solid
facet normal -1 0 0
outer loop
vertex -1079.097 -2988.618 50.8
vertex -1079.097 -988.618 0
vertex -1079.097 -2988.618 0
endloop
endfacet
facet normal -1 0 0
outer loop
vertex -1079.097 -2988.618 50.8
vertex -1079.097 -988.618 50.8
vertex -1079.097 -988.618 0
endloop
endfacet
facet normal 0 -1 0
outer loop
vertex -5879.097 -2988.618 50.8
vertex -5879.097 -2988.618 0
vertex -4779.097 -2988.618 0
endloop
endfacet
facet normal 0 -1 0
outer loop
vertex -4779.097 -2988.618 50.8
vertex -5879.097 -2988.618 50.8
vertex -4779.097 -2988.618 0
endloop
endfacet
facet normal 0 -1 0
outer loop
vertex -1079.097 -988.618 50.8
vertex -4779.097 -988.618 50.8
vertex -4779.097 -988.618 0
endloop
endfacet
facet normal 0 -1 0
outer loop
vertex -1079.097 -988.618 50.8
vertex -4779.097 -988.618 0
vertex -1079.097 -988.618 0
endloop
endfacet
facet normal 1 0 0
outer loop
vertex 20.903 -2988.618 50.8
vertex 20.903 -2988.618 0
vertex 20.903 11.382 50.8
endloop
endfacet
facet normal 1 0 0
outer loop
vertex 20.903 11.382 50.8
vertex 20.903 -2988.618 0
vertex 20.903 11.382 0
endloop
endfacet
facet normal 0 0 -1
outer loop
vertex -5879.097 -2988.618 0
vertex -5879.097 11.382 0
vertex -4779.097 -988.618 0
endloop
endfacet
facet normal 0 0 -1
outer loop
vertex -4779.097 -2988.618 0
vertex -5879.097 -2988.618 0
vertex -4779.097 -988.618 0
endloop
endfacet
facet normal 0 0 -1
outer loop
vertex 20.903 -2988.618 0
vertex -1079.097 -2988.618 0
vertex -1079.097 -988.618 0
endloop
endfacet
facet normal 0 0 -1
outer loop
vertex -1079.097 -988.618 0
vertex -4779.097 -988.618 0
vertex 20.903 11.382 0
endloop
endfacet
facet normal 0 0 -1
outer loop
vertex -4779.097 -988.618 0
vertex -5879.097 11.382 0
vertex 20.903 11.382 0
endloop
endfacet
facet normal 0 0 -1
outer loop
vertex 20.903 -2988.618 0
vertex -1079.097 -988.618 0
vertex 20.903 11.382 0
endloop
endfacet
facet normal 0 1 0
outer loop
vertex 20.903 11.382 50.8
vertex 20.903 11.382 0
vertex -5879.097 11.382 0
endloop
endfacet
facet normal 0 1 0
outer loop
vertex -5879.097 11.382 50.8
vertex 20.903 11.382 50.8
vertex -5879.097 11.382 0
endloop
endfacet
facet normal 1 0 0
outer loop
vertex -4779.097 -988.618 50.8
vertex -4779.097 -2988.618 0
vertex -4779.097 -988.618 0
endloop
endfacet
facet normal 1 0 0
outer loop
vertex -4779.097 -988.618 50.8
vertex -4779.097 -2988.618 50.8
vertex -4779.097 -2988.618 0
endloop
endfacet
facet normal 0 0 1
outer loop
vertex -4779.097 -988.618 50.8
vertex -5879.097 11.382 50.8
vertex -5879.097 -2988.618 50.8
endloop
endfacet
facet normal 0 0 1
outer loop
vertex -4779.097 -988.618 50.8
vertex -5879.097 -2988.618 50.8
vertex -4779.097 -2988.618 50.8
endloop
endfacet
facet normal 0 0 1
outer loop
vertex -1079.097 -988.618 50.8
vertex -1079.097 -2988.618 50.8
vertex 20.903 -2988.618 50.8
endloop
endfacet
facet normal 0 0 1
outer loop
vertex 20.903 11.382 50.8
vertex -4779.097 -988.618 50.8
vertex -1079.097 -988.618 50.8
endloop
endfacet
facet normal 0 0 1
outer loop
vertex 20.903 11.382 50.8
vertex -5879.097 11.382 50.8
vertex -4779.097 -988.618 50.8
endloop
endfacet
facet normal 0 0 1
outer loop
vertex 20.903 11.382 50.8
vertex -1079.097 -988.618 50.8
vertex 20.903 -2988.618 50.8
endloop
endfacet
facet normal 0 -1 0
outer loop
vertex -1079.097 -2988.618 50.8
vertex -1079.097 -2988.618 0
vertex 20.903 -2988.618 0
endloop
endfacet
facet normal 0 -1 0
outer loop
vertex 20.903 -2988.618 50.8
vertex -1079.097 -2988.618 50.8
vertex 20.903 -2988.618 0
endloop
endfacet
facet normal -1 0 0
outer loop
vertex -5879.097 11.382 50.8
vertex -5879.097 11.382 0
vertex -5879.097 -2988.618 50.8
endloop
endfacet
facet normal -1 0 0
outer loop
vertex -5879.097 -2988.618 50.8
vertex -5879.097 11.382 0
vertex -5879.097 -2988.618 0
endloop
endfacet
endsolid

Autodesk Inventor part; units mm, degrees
ref_plane "YZ Plane" through (0, 0, 0) normal (1, 0, 0) x (0, 1, 0)
ref_plane "XZ Plane" through (0, 0, 0) normal (0, 1, 0) x (-1, 0, 0)
ref_plane "XY Plane" through (0, 0, 0) normal (0, 0, 1) x (1, 0, 0)
sketch "Sketch1" plane through (0, 0, 0) normal (0, 0, 1) x (1, 0, 0)
  line L0 (-5879.0972, -2988.6181) -> (20.9028, -2988.6181)
  line L1 (20.9028, -2988.6181) -> (20.9028, 11.3819)
  line L2 (20.9028, 11.3819) -> (-5879.0972, 11.3819)
  line L3 (-5879.0972, 11.3819) -> (-5879.0972, -2988.6181)
  point P0 (0, 0)
  dimension "Ancho" = 5900
  dimension "Alto" = 3000
extrude "Extrusion1" add sketch "Sketch1" along normal blind 50.8
sketch "Sketch2" plane through (0, 0, 50.8) normal (0, 0, 1) x (1, 0, 0)
  line L0 (-5879.0972, -2988.6181) -> (20.9028, -2988.6181) projected
  line L1 (-4779.0972, -988.6181) -> (-1079.0972, -988.6181)
  line L2 (-1079.0972, -988.6181) -> (-1079.0972, -2988.6181)
  line L3 (-1079.0972, -2988.6181) -> (-4779.0972, -2988.6181)
  line L4 (-4779.0972, -2988.6181) -> (-4779.0972, -988.6181)
  line L5 (-4779.0972, -988.6181) -> (-1079.0972, -2988.6181) construction
  line L6 (-1079.0972, -988.6181) -> (-4779.0972, -2988.6181) construction
  line L7 (-5879.0972, 11.3819) -> (-5879.0972, -2988.6181) projected
  point P0 (0, 0)
  point P1 (-2929.0972, -1988.6181)
  dimension "Distanciapuerta" = 3700
  dimension "Alturapuerta" = 2000
  dimension "d10" = 1100
extrude "Extrusion2" cut sketch "Sketch2" against normal through all
equation "\"Ancho\" = PL_S"
equation "\"Alto\" = PA_S"
equation "\"Espesor\" = PE_S"
equation "\"Distanciapuerta\" = DP_S"
equation "\"Alturapuerta\" = AP_S"
equation "\"d10\" = -0.5 * DP_S + 0.5 * PL_S"
equation "\"PL_S\" = 5900"
equation "\"PA_S\" = 3000"
equation "\"PE_S\" = 50.8"
equation "\"DP_S\" = 3700"
equation "\"AP_S\" = 2000"
equation "\"PE_N\" = 50.8"
equation "\"PE_EO\" = 50.8"
equation "\"T_E\" = 50.8"
equation "\"lon_ve\" = 512.5"
equation "\"n_a\" = 3"
equation "\"t_a\" = 19.05"
equation "\"d_a\" = 128.125"
equation "\"lon_ho\" = 749"
equation "\"d_bor\" = 59.92"
equation "\"lon_gui\" = 187.25"
equation "\"esp_gui\" = 461.25"
equation "\"lon_ve2\" = 498.475"
equation "\"n_a2\" = 3"
equation "\"t_a2\" = 124.61875"
equation "\"d_a2\" = 124.61875"
equation "\"lon_ho2\" = 933.45"
equation "\"d_bor2\" = 74.676"
equation "\"lon_gui2\" = 233.3625"
equation "\"esp_gui2\" = 448.6275"
equation "\"UE_L\" = 2111"
equation "\"UE_A\" = 1025"
equation "\"UE_AN\" = 749"
equation "\"UC_L\" = 1314.45"
equation "\"UC_A\" = 996.95"
equation "\"UC_AN\" = 933.45"
equation "\"A_ET\" = 35"
equation "\"SEP_NS\" = 0"
equation "\"DSEG\" = 0"
equation "\"AEGEP_NS\" = 0"
equation "\"DNS\" = 749"
properties part number "Pared sur"
